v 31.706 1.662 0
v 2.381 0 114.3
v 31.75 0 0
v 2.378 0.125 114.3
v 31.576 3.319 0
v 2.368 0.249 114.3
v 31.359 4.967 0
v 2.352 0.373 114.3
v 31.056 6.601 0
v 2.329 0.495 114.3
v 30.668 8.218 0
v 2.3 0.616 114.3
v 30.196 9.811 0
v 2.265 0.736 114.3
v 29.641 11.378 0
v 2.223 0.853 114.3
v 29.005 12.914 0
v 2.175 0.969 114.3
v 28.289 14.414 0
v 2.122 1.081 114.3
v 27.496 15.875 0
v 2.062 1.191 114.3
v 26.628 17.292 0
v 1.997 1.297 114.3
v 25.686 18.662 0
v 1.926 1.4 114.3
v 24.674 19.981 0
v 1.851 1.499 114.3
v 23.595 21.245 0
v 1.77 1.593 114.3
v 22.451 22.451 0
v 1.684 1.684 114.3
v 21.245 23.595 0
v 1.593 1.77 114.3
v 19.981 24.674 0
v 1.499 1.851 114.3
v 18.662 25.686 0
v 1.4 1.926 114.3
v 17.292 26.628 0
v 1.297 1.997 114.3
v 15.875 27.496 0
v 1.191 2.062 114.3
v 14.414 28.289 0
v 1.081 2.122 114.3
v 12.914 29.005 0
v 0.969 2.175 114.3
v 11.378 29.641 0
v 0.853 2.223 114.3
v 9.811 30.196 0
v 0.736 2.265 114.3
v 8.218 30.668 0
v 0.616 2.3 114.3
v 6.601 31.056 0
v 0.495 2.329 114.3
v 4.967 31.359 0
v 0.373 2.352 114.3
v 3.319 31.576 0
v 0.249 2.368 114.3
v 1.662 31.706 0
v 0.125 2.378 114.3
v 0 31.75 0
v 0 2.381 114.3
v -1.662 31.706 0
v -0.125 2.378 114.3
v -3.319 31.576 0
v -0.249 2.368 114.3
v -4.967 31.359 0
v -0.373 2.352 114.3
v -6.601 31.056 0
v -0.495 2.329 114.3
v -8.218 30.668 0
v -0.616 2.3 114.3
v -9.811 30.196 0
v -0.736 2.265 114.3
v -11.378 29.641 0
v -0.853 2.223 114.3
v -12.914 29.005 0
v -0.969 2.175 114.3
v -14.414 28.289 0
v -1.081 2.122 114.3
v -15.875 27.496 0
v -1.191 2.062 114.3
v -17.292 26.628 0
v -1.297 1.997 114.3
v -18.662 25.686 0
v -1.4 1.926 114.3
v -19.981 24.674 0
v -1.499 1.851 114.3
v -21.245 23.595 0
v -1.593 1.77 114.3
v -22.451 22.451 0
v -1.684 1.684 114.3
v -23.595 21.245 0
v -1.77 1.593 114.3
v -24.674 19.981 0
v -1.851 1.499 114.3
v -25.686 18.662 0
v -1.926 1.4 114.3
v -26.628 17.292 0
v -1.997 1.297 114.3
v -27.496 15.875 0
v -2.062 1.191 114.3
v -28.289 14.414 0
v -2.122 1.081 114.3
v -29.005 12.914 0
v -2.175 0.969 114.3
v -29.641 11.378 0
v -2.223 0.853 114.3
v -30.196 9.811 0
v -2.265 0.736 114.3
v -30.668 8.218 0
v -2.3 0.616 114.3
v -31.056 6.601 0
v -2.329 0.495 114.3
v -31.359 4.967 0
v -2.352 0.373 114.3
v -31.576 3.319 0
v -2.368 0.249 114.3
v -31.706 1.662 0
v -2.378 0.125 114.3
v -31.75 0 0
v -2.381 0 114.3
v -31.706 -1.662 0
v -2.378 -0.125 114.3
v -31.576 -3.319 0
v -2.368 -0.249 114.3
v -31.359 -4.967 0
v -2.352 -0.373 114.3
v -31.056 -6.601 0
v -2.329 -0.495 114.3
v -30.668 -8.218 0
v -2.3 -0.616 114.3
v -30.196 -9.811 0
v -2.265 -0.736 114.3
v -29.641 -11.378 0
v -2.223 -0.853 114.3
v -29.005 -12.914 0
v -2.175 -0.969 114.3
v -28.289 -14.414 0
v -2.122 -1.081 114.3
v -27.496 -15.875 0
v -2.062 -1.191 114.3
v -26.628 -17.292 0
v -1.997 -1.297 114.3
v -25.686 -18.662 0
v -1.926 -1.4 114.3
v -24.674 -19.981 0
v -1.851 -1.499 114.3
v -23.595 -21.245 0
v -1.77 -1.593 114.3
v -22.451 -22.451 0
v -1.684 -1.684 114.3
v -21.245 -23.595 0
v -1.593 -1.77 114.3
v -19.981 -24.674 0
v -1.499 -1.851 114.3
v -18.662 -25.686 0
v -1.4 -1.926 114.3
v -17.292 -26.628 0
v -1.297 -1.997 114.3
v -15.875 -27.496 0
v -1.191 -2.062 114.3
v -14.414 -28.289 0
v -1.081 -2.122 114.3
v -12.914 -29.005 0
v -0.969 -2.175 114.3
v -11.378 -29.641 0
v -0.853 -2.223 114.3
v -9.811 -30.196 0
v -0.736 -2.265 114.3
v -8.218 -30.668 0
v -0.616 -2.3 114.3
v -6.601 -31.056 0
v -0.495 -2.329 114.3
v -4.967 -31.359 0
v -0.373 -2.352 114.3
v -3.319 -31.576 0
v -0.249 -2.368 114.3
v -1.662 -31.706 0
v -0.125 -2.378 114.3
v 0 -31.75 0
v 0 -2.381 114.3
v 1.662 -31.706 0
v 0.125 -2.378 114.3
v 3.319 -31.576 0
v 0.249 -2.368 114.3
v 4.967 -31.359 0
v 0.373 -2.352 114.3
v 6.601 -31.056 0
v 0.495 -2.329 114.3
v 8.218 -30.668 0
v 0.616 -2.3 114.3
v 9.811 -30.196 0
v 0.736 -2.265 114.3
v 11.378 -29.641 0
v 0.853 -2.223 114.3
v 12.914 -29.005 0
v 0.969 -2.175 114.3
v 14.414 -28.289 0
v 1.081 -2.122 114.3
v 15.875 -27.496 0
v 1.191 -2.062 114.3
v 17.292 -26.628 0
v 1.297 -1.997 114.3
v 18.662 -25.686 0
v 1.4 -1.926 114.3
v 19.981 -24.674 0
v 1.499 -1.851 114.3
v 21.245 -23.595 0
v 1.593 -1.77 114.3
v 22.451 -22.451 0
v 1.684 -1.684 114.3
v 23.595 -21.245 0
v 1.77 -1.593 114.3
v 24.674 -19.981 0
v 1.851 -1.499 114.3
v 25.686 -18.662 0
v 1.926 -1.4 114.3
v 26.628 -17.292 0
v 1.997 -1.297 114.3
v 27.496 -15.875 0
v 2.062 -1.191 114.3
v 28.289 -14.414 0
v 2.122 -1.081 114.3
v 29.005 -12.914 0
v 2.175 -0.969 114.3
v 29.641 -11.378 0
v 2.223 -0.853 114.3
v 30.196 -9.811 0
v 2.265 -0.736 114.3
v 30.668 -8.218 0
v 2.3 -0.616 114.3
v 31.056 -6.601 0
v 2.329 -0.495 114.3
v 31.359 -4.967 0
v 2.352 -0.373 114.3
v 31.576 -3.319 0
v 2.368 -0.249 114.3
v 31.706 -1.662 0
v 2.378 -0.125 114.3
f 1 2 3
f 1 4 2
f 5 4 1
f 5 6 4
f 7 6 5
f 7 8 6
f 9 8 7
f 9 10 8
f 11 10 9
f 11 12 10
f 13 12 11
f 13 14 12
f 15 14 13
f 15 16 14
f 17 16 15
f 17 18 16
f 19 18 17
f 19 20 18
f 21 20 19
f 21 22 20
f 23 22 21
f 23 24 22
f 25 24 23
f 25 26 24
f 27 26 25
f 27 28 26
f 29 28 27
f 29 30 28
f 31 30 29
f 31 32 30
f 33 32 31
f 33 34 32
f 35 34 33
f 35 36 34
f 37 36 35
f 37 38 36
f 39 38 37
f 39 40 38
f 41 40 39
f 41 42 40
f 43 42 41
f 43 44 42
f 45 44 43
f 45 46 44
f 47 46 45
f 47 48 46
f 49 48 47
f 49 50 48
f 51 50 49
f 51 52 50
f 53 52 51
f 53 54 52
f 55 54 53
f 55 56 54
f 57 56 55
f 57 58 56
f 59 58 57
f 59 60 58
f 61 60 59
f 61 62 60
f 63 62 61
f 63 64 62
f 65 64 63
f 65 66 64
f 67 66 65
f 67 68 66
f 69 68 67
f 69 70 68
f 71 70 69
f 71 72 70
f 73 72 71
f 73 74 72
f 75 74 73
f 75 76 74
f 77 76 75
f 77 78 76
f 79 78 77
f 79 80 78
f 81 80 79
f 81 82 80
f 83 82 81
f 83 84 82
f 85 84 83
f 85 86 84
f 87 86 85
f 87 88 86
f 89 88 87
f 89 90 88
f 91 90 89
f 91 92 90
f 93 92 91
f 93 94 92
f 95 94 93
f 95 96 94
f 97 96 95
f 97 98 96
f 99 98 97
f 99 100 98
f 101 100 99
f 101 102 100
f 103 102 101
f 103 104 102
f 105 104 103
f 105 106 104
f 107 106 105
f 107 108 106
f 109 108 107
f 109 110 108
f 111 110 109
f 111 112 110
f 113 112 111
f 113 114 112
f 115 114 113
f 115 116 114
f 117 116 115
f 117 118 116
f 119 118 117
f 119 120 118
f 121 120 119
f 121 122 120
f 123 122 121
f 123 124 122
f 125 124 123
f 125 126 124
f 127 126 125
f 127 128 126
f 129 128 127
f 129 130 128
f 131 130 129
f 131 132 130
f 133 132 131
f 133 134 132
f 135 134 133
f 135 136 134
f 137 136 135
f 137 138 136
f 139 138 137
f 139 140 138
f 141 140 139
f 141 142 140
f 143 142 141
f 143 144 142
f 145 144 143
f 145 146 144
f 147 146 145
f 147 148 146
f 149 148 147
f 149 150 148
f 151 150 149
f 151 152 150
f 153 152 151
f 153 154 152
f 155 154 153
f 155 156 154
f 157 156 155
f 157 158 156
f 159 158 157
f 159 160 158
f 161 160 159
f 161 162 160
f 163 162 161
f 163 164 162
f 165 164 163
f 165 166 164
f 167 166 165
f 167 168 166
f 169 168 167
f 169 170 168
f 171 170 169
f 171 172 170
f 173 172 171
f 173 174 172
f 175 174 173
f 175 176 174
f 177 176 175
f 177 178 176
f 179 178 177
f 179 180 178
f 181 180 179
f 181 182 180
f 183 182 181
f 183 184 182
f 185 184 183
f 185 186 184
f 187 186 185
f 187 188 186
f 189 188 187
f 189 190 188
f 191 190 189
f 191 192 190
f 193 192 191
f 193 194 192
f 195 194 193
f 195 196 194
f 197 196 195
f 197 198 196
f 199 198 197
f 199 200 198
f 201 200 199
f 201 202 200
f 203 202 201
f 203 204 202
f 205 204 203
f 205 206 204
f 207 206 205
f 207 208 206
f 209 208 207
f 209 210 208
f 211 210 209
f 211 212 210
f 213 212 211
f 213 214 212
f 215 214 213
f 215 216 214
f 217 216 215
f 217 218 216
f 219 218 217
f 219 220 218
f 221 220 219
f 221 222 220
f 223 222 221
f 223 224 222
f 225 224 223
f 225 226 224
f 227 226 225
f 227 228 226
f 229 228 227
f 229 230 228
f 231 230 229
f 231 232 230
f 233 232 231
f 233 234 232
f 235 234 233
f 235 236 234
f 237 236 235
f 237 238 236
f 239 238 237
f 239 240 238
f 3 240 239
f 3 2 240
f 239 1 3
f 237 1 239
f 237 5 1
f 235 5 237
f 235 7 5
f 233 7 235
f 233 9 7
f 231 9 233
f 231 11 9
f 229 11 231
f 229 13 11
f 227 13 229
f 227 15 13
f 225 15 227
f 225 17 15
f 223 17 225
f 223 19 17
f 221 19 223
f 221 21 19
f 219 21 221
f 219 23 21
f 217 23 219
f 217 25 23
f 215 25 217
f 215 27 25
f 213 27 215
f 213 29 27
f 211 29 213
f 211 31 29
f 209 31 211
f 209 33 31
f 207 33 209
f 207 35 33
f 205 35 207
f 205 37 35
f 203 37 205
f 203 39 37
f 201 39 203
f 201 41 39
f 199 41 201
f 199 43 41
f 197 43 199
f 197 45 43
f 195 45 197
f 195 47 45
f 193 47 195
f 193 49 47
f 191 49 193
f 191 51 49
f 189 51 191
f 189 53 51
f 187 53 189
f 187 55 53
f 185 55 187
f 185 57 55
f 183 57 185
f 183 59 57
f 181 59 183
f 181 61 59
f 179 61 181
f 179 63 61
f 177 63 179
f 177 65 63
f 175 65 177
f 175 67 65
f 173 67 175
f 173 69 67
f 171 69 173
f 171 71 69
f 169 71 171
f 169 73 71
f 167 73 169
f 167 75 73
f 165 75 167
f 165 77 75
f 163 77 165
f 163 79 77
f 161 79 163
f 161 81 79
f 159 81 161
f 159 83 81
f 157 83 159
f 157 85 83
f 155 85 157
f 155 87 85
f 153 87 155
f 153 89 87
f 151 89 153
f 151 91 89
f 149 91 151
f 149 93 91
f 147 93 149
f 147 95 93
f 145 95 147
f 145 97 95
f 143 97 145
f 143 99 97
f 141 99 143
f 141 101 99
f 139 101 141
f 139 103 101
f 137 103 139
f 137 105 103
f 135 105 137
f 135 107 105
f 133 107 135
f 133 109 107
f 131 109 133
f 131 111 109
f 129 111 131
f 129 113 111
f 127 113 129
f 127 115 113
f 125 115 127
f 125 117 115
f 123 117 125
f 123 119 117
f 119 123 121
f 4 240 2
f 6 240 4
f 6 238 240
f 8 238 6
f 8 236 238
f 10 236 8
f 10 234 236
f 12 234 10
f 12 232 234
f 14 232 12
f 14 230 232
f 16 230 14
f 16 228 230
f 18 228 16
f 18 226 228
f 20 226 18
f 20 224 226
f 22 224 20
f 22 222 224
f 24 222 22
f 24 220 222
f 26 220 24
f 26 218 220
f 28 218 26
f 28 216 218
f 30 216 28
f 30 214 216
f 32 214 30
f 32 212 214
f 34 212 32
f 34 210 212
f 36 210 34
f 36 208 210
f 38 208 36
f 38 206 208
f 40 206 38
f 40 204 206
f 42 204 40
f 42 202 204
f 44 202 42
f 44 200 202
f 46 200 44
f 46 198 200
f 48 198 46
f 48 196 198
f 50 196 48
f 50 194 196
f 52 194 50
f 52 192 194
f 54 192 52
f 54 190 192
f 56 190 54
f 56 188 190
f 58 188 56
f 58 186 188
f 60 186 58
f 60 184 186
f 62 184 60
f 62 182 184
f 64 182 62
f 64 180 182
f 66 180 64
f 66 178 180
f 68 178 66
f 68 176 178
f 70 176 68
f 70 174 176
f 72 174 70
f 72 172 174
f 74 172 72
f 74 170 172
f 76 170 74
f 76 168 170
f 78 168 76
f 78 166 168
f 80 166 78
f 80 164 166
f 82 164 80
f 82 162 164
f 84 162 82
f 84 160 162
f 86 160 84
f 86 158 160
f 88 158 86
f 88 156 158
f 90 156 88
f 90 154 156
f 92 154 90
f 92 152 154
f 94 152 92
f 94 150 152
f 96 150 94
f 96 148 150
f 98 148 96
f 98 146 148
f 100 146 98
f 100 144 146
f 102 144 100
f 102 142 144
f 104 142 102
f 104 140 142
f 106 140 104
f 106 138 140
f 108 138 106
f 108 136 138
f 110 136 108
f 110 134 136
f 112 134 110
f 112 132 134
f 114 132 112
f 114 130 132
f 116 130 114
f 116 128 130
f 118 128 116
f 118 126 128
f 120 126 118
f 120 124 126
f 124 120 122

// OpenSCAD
//Base Diameter (in inches)
large_diameter_in_inches = 2.5;

//Top Diameter (in inches)
top_diameter_in_inches = 0.1875;

//Cone Height (in inches)
height_in_inches = 4.5;

rad1=large_diameter_in_inches*25.4/2;
rad2=top_diameter_in_inches*25.4/2;

hgt=height_in_inches*25.4;

cylinder(h=hgt, r1=rad1, r2=rad2, center=false,$fn = 120);
